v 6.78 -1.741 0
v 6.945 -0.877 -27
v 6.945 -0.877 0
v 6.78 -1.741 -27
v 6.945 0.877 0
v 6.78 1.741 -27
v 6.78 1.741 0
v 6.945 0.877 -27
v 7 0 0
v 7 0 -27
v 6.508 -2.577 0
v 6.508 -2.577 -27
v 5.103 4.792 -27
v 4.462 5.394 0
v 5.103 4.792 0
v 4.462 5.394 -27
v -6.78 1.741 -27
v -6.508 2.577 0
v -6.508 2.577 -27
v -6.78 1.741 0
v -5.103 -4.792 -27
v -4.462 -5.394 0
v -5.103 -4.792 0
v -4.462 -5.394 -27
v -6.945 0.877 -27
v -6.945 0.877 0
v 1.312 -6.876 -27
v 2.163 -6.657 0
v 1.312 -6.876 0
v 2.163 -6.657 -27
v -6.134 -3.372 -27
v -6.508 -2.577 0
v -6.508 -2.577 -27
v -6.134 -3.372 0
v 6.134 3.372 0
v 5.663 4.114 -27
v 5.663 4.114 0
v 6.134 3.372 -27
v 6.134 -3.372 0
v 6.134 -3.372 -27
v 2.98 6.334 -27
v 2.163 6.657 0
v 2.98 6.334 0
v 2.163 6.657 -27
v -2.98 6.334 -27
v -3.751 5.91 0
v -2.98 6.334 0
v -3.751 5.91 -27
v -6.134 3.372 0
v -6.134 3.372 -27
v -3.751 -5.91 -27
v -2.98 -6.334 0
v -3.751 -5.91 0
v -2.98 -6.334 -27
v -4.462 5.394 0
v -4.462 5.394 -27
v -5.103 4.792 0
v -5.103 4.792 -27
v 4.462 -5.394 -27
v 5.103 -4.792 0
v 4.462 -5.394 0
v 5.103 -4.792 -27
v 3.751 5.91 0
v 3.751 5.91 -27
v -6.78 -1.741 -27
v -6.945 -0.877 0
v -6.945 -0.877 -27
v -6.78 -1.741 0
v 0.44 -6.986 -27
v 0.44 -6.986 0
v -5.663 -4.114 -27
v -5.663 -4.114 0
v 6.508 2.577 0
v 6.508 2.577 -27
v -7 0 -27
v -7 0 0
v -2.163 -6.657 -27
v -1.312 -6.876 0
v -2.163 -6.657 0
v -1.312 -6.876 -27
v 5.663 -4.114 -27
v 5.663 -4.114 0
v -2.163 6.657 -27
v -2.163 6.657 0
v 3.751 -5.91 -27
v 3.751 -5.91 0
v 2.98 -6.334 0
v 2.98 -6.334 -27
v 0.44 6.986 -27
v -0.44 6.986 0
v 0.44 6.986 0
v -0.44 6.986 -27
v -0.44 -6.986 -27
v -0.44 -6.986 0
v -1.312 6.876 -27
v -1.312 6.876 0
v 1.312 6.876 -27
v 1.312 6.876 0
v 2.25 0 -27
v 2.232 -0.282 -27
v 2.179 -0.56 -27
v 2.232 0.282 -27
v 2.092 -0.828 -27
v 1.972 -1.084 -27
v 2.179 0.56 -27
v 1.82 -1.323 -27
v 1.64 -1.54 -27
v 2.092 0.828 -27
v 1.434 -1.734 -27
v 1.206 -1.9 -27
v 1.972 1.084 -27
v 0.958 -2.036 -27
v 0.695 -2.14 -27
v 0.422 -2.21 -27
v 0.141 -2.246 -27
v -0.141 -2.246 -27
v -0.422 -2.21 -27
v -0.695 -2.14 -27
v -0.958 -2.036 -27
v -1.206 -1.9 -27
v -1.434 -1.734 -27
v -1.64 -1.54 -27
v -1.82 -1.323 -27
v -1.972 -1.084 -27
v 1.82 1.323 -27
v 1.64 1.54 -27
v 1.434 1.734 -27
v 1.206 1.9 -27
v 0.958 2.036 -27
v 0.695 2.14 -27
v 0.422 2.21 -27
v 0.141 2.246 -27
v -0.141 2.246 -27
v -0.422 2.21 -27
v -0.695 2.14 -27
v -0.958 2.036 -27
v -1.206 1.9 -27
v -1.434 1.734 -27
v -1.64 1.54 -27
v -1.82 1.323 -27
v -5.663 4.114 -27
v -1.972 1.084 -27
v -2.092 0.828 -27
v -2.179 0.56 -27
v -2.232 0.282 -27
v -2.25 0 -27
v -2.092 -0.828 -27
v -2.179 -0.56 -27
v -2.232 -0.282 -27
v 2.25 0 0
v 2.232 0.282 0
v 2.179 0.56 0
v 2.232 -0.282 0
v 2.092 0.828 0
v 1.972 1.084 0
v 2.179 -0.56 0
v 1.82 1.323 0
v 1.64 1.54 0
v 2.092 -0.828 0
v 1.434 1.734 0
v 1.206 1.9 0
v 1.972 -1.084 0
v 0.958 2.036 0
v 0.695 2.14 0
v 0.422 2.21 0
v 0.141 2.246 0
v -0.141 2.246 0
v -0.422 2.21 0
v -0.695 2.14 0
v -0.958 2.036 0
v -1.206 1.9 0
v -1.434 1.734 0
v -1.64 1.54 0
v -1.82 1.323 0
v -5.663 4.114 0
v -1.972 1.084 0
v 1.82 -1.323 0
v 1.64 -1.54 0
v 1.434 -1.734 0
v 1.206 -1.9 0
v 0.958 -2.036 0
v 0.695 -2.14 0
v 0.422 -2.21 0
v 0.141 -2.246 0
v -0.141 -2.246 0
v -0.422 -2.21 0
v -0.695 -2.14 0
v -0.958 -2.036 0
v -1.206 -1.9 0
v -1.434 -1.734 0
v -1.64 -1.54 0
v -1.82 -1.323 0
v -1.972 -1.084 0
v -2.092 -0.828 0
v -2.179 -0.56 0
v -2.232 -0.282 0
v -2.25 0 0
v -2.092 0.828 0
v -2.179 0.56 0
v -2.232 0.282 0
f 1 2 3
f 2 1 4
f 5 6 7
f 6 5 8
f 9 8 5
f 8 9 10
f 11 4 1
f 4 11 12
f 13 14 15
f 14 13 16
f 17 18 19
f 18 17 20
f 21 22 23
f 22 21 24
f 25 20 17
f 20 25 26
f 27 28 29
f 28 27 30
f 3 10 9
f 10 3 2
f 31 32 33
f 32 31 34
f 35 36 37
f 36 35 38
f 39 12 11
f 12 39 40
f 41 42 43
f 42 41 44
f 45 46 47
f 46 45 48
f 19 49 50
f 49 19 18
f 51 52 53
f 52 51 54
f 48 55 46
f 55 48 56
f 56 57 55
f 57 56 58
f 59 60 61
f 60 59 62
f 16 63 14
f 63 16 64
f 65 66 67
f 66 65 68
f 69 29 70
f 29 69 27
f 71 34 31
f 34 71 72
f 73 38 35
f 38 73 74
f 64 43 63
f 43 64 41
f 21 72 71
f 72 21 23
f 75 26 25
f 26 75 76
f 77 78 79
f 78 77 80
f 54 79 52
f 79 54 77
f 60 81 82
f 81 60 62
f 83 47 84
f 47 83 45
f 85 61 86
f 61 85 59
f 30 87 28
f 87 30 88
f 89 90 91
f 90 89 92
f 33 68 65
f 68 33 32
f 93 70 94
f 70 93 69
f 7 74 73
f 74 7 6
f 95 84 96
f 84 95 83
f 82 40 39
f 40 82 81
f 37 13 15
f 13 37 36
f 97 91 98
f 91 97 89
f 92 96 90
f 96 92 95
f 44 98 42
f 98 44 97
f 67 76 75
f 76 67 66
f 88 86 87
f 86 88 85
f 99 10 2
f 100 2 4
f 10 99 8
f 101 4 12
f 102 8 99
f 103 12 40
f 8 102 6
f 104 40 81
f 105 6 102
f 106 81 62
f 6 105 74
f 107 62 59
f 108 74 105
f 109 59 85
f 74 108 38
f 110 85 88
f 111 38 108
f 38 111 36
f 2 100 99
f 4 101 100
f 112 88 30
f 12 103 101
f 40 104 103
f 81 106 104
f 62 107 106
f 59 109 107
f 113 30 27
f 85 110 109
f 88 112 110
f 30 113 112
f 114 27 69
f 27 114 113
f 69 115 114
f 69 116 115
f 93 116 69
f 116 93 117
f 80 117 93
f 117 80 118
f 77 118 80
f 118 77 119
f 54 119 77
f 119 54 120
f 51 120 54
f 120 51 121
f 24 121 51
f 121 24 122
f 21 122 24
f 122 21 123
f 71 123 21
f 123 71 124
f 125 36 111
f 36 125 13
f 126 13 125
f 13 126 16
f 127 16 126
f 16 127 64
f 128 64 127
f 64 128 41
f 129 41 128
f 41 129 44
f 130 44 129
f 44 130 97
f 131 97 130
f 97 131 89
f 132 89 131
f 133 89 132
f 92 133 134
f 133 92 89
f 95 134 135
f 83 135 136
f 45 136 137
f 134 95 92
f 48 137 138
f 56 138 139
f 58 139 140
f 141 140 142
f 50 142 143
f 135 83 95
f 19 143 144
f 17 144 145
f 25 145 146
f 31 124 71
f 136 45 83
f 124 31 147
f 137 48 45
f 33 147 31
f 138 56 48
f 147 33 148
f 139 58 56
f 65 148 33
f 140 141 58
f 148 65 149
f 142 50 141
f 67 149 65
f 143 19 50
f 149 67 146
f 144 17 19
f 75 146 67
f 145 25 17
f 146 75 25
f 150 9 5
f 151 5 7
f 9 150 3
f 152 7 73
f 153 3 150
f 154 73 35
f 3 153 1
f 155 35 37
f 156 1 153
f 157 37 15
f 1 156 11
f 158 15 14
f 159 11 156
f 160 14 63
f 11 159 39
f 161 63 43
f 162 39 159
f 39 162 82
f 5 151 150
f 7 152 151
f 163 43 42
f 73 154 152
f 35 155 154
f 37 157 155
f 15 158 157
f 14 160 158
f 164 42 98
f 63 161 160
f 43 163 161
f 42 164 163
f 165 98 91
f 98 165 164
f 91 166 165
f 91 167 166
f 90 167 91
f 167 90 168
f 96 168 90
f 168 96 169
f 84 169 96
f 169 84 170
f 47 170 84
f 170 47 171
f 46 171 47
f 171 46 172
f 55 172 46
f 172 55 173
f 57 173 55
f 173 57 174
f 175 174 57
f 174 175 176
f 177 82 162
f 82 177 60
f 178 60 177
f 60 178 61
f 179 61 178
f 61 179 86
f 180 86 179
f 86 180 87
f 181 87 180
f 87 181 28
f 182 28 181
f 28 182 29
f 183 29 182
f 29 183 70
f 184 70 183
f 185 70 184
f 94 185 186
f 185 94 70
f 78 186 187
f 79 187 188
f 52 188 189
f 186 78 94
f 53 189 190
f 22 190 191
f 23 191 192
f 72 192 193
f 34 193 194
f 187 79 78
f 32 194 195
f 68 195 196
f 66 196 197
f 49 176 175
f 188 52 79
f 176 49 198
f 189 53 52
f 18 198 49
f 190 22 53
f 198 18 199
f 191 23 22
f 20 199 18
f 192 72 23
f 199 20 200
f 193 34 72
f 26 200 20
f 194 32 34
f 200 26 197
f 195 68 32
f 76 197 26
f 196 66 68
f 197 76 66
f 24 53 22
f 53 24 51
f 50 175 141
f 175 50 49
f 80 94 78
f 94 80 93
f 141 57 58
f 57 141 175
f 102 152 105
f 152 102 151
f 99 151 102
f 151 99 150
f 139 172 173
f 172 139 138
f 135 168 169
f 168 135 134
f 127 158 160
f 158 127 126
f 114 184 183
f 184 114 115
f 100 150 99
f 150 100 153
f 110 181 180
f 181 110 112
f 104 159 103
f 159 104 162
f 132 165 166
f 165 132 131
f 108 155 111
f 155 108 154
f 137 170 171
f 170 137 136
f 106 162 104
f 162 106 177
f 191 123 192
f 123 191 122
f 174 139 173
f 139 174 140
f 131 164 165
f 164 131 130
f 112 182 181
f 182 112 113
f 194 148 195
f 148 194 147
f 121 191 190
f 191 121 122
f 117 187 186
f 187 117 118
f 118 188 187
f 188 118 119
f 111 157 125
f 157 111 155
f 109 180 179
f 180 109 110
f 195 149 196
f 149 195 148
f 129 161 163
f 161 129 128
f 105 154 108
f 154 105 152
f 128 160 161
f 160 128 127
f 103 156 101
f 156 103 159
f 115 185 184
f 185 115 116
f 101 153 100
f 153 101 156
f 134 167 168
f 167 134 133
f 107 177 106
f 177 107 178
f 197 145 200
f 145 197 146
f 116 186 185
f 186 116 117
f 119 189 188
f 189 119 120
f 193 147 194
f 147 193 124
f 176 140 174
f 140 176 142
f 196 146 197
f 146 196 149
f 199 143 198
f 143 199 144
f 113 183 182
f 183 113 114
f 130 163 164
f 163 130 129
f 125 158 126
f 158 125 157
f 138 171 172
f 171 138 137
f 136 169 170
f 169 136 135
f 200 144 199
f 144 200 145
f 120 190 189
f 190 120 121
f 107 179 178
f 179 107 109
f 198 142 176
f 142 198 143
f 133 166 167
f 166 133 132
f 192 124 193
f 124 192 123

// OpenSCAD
$fn = 50;


difference() {
	union() {
		translate(v = [0, 0, -27.0000000000]) {
			cylinder(h = 27, r = 7.0000000000);
		}
		cylinder(h = 0, r = 10.0000000000);
	}
	union() {
		#translate(v = [0, 0, -27]) {
			cylinder(h = 27, r = 2.2500000000);
		}
	}
}
